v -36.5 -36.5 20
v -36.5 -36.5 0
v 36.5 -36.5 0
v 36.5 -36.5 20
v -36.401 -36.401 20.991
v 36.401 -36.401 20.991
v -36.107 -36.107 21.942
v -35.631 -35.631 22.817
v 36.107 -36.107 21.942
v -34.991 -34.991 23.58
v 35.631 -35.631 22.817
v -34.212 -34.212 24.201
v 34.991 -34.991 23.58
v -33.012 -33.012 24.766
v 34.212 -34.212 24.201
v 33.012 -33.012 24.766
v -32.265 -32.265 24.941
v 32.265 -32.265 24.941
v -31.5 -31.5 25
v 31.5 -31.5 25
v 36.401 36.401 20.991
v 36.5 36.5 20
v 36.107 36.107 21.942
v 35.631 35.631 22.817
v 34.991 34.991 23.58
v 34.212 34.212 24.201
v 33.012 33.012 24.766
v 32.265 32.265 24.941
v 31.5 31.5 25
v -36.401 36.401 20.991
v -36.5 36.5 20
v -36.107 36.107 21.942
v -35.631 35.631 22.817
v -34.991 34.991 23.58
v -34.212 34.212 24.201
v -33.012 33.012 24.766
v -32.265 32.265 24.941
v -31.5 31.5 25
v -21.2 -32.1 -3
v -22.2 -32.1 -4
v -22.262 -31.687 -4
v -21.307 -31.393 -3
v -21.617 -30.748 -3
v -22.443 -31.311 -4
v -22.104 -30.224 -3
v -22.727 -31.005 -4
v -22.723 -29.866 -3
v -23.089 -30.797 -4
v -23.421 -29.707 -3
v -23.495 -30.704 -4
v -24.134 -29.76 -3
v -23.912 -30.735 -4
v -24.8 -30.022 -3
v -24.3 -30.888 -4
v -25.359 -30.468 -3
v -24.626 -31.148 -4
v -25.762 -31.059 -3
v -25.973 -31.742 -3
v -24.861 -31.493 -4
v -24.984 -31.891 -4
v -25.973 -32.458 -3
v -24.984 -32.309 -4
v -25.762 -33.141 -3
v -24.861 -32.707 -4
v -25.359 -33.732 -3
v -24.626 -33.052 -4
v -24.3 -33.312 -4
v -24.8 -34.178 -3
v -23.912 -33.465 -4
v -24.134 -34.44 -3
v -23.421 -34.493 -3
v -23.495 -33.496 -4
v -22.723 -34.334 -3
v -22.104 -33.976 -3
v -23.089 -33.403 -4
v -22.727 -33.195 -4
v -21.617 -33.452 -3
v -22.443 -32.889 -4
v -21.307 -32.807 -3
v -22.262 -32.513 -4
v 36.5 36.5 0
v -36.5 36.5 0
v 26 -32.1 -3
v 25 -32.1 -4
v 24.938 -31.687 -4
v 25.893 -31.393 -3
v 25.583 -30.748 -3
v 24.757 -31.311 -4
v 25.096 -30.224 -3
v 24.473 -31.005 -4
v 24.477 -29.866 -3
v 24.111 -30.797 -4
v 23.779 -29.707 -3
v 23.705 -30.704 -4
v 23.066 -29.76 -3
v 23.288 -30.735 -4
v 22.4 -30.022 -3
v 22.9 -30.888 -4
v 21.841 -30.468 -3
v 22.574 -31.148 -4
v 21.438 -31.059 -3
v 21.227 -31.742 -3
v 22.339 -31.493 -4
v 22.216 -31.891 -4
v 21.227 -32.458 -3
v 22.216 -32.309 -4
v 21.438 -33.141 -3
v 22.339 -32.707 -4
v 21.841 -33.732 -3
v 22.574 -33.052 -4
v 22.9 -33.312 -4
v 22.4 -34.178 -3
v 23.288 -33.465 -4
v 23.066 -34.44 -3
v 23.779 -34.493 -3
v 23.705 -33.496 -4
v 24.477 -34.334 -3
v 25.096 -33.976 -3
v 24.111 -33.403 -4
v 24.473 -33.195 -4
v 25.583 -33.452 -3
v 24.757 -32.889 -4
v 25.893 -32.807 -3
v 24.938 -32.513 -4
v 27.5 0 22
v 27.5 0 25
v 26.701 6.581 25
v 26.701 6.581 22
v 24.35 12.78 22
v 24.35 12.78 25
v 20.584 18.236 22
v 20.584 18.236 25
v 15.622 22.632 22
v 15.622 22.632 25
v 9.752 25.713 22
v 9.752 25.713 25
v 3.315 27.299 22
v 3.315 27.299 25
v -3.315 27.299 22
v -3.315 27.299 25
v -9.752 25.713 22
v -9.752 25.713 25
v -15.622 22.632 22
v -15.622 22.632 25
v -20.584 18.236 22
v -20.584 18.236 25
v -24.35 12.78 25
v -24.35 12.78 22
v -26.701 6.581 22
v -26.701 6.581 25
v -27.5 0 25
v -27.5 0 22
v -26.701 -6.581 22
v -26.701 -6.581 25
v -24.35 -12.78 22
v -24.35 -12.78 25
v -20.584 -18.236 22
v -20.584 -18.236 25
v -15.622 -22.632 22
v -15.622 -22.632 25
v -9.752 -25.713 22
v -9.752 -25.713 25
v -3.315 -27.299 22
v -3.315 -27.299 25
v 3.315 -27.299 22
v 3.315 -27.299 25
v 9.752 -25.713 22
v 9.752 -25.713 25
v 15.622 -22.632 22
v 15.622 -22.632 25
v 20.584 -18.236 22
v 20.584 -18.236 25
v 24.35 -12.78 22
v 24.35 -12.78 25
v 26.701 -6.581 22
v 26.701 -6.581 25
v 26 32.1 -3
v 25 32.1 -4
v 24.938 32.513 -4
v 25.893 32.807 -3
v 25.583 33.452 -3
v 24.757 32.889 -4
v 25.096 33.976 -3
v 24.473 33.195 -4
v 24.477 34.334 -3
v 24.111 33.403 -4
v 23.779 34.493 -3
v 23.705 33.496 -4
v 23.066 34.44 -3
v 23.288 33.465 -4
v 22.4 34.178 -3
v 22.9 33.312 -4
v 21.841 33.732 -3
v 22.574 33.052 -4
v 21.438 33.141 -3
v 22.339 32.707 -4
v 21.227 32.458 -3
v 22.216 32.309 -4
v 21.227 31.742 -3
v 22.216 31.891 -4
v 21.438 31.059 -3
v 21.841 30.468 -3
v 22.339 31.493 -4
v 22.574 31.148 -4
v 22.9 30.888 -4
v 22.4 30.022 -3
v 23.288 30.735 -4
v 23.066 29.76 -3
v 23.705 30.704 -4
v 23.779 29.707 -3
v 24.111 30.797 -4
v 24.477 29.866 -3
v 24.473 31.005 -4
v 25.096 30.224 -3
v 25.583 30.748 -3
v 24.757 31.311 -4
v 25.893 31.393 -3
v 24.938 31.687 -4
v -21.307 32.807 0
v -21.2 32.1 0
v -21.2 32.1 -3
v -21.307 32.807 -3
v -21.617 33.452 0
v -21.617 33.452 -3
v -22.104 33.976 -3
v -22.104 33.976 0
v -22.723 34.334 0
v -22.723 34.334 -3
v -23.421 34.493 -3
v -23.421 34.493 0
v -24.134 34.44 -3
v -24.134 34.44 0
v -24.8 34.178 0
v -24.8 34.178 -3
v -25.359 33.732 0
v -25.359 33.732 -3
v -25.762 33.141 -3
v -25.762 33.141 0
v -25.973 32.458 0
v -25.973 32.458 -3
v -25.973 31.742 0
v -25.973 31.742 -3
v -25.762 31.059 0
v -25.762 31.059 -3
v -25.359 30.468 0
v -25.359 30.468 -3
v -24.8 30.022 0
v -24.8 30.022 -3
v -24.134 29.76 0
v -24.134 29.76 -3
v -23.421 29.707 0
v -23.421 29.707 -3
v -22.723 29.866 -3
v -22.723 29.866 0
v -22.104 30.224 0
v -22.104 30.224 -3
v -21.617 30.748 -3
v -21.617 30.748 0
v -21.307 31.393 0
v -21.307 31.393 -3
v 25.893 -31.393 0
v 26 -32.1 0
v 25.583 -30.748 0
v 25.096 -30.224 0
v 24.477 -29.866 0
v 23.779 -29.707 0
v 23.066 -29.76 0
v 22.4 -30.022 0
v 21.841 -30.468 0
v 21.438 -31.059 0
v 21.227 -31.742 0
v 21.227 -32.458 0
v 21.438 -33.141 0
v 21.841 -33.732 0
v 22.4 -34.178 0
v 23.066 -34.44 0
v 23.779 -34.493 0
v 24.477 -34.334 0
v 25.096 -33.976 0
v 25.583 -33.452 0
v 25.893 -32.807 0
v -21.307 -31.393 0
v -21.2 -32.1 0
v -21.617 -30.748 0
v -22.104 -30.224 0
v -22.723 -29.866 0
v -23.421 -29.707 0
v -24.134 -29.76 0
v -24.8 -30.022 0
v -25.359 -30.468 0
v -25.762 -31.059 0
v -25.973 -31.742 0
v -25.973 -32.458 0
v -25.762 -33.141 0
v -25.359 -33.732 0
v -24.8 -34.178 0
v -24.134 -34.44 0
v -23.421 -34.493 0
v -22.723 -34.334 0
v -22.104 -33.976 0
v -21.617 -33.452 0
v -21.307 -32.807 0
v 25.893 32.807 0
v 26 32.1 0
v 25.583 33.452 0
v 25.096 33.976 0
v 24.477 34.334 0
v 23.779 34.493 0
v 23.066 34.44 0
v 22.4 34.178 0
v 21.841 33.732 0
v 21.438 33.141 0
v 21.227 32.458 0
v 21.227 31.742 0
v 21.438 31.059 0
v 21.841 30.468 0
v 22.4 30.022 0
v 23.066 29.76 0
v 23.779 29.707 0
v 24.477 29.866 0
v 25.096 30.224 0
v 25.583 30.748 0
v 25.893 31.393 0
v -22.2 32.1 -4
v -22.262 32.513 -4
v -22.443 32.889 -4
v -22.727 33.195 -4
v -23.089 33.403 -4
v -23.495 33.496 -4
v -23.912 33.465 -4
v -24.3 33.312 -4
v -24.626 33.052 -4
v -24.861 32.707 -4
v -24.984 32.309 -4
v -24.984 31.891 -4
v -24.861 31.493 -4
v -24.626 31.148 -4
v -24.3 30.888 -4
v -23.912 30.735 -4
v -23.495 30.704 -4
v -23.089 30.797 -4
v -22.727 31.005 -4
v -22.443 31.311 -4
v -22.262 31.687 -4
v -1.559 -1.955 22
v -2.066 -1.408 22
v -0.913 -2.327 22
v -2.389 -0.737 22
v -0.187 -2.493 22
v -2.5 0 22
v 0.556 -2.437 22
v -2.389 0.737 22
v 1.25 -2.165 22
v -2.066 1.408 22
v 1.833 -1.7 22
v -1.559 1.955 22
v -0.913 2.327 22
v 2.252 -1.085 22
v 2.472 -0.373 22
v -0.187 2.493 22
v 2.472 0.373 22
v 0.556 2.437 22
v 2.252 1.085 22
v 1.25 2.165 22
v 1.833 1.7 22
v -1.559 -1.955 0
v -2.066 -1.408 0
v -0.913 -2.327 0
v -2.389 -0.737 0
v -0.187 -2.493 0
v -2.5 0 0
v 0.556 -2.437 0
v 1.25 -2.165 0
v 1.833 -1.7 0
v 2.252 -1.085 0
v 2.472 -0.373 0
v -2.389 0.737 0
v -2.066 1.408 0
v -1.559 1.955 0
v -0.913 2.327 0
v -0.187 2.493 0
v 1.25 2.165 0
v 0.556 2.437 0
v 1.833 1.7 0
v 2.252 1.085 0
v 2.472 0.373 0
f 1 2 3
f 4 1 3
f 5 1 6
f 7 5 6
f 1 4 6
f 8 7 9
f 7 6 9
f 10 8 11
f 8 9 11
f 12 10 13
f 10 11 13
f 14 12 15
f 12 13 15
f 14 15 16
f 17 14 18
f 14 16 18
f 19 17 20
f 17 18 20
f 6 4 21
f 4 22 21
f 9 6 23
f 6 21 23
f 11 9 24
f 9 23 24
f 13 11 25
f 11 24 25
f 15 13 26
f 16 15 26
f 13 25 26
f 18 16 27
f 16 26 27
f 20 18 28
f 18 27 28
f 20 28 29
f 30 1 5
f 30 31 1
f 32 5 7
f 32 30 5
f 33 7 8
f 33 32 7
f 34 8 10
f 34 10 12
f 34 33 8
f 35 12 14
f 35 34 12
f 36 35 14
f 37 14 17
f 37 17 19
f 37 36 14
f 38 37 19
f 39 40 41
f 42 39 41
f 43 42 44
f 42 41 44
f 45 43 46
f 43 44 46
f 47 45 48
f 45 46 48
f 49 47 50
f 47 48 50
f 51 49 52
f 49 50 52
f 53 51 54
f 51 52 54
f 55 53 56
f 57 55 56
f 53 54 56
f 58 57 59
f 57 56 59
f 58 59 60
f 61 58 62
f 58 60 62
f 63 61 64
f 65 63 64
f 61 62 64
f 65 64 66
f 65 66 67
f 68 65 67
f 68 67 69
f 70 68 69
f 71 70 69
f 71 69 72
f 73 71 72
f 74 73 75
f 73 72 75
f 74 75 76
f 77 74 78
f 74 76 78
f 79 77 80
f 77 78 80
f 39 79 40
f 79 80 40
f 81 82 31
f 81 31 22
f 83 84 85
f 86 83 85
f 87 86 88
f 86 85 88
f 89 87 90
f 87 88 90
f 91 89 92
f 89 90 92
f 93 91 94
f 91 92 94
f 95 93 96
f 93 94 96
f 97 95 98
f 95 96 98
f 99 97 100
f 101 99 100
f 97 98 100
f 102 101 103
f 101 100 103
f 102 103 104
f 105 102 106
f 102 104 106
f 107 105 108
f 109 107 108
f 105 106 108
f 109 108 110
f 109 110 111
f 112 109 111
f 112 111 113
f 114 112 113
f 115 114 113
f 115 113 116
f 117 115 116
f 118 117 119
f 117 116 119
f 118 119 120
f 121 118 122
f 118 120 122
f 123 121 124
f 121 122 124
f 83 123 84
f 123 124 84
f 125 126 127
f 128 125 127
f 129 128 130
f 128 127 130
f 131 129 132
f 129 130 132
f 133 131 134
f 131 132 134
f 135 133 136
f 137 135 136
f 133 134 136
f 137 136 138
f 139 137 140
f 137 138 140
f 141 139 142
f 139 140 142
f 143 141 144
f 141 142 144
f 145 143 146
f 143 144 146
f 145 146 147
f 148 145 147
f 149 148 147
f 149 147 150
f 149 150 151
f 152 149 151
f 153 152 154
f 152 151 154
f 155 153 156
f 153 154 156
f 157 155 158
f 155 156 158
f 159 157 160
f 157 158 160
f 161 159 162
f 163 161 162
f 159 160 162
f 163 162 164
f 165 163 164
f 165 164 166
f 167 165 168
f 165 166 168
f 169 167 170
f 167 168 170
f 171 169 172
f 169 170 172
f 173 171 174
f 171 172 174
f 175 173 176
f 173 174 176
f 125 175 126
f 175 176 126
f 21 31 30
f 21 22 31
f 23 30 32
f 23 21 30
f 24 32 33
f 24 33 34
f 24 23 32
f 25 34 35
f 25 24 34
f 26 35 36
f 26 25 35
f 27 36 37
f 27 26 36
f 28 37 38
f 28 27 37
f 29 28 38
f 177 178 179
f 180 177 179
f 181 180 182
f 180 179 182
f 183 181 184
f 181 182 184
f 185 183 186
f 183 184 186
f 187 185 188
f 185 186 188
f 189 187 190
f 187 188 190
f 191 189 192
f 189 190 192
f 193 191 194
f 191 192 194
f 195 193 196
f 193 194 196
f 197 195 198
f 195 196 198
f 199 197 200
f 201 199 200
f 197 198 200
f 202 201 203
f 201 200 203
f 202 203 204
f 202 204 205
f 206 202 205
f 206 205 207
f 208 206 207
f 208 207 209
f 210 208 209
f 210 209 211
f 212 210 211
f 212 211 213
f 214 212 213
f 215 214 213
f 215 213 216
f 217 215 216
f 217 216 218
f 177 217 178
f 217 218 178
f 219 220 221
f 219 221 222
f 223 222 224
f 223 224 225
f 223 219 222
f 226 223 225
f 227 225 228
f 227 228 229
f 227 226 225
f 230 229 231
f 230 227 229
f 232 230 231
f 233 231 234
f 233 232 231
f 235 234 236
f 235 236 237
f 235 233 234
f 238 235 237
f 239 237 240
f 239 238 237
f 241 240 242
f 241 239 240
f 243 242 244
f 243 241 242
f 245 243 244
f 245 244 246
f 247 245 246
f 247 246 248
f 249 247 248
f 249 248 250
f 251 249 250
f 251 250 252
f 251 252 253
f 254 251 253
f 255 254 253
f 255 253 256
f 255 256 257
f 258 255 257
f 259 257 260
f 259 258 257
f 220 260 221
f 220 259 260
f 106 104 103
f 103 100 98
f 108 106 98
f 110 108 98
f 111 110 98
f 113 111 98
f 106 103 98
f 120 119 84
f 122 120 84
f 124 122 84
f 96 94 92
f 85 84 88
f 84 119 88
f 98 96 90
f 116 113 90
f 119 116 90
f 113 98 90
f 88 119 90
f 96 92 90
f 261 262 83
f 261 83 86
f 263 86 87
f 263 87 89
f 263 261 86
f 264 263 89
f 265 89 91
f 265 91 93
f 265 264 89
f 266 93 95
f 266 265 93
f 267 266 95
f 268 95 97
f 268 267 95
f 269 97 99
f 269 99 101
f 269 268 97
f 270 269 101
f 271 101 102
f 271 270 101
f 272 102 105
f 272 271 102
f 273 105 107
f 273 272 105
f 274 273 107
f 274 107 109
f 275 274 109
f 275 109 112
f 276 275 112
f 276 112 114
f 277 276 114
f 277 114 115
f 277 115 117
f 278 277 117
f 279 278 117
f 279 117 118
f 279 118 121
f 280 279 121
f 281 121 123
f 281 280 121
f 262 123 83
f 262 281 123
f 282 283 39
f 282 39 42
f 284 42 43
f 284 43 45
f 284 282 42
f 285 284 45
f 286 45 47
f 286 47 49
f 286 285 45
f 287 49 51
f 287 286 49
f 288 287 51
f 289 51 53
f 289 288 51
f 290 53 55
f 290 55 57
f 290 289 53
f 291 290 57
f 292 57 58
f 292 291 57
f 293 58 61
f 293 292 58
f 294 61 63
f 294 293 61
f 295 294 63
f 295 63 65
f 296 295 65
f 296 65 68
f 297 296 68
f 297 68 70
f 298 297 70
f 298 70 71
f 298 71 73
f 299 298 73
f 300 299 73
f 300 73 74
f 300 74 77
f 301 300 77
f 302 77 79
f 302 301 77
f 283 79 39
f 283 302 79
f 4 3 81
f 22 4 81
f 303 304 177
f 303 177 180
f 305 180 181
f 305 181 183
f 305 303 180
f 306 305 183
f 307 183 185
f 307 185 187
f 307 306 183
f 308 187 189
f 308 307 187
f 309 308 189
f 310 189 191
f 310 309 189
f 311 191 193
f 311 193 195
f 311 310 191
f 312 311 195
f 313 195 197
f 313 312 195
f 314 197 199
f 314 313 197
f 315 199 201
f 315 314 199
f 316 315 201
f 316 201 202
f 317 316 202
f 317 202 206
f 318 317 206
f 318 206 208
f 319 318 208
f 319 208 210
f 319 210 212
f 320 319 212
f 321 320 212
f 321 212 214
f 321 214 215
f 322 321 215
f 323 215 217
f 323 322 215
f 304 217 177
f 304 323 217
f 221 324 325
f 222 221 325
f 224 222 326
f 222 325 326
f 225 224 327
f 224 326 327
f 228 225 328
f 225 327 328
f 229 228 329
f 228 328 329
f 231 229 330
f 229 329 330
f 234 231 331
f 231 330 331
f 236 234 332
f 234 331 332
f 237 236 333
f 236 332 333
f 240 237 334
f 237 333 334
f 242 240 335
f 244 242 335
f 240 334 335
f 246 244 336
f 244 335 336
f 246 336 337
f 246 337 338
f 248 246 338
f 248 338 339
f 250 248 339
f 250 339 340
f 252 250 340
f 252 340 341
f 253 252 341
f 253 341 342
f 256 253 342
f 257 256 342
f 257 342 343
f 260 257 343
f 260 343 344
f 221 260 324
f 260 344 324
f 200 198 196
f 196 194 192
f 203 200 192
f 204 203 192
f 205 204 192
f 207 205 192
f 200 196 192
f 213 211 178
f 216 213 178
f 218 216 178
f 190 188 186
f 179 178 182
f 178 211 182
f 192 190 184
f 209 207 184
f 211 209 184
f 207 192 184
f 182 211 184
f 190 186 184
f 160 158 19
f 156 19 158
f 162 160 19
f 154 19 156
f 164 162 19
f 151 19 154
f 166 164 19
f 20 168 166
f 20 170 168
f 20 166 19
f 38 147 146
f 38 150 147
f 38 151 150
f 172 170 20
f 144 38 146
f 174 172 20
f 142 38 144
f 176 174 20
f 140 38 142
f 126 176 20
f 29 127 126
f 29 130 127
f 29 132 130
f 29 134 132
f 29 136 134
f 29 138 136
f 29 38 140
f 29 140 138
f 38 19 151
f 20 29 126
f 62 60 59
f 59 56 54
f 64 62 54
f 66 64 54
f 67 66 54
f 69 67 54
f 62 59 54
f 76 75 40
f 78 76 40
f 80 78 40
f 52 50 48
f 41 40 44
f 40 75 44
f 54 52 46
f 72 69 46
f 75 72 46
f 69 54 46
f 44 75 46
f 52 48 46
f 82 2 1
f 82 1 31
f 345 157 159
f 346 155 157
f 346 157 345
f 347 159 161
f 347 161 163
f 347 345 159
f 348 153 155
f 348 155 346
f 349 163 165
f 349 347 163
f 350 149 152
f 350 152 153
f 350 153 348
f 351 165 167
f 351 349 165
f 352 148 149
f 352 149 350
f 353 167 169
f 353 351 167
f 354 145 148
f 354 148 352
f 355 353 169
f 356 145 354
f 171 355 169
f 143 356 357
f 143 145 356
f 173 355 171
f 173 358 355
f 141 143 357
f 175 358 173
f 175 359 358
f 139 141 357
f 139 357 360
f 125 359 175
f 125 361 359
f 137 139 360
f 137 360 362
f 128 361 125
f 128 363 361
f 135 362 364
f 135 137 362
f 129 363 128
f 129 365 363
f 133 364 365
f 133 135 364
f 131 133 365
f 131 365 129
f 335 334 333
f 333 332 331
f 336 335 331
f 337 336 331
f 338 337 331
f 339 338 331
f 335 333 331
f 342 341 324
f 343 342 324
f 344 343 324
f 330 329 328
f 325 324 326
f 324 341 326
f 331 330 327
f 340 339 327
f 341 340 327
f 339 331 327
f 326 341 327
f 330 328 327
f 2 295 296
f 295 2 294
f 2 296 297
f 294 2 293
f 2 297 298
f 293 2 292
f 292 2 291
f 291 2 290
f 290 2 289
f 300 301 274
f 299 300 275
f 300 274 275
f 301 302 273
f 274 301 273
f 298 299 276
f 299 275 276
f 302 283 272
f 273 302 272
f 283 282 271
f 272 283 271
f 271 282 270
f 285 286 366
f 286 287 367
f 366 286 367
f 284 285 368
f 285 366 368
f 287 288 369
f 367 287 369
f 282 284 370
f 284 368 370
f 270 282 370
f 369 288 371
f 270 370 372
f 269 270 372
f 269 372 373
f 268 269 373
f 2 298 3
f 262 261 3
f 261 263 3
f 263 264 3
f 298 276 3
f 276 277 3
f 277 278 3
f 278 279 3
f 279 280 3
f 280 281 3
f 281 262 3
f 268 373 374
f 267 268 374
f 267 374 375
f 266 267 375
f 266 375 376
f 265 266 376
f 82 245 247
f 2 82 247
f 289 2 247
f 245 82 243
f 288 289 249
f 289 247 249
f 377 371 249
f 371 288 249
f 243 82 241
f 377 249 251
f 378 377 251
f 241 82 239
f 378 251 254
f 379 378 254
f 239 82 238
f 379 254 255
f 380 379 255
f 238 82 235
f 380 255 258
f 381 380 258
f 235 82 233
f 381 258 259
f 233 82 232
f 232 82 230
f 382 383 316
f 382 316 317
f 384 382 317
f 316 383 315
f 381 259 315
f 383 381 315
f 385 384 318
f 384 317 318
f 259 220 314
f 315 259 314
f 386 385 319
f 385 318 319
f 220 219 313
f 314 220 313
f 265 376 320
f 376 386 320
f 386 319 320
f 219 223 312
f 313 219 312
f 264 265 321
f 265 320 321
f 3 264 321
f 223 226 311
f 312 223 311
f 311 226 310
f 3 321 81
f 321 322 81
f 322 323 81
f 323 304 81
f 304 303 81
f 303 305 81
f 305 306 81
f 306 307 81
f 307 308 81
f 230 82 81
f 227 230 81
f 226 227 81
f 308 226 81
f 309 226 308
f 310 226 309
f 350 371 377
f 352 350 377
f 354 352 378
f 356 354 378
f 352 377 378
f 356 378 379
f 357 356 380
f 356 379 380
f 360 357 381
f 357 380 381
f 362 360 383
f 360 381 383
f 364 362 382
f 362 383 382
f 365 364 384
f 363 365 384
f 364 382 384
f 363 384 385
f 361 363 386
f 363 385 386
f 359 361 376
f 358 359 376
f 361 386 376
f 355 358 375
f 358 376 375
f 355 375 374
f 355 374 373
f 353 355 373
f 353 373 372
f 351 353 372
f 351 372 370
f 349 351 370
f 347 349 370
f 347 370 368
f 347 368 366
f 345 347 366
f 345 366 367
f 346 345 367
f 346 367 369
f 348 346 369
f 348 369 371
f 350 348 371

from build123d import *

# Parameters (mm, degrees)
F0_W      = 73
F0_H      = 73
F1_DEPTH  = 25
F2_R      = 5
F3_R      = 27.5
F4_DEPTH  = 3
F5_R      = 2.4
F6_DEPTH  = 4
F7_SIZE   = 1
F9_W      = 110.5126142502
F9_H      = 98.0203673244
F10_DEPTH = 40.1
F14_D     = 5


# Not quite as in the source:
# - a feature of the source that left no trace in its solid (it failed there, or was rolled back) is left out


with BuildPart() as f1:
    # F0 (on Top) → F1 (new body)
    with BuildSketch(Plane.XY):
        Rectangle(F0_W, F0_H)
    extrude(amount=F1_DEPTH)

    # F2
    f2_edges = [f1.edges().sort_by_distance(p)[0] for p in [
        (0, 36.5, 25),
        (0, -36.5, 25),
        (36.5, 0, 25),
        (-36.5, 0, 25),
    ]]
    fillet(f2_edges, radius=F2_R)

    # F3 (on face) → F4 (cut)
    with BuildSketch(Plane.XY.offset(25)):
        Circle(F3_R)
    extrude(amount=-F4_DEPTH, mode=Mode.SUBTRACT)

    # F5 (on face) → F6 (join)
    with BuildSketch(Plane.XY):
        with Locations((-23.6, -32.1)):
            Circle(F5_R)
        with Locations((23.6, -32.1)):
            Circle(F5_R)
        with Locations((-23.6, 32.1)):
            Circle(F5_R)
        with Locations((23.6, 32.1)):
            Circle(F5_R)
    extrude(amount=-F6_DEPTH)

    # F7
    f7_edges = [f1.edges().sort_by_distance(p)[0] for p in [
        (-26, -32.1, -4),
        (-26, 32.1, -4),
        (21.2, 32.1, -4),
        (21.2, -32.1, -4),
    ]]
    chamfer(f7_edges, length=F7_SIZE)

    # F14 (through all)
    with Locations(Plane.XY.offset(22)):
        with Locations((0, 0)):
            Hole(F14_D / 2)


with BuildPart() as f10:
    # F9 (on offset) → F10 (new body, through all)
    with BuildSketch(Plane.XY.offset(40.1)):
        Rectangle(F9_W, F9_H)
    extrude(amount=-F10_DEPTH)


solid = f1.part
